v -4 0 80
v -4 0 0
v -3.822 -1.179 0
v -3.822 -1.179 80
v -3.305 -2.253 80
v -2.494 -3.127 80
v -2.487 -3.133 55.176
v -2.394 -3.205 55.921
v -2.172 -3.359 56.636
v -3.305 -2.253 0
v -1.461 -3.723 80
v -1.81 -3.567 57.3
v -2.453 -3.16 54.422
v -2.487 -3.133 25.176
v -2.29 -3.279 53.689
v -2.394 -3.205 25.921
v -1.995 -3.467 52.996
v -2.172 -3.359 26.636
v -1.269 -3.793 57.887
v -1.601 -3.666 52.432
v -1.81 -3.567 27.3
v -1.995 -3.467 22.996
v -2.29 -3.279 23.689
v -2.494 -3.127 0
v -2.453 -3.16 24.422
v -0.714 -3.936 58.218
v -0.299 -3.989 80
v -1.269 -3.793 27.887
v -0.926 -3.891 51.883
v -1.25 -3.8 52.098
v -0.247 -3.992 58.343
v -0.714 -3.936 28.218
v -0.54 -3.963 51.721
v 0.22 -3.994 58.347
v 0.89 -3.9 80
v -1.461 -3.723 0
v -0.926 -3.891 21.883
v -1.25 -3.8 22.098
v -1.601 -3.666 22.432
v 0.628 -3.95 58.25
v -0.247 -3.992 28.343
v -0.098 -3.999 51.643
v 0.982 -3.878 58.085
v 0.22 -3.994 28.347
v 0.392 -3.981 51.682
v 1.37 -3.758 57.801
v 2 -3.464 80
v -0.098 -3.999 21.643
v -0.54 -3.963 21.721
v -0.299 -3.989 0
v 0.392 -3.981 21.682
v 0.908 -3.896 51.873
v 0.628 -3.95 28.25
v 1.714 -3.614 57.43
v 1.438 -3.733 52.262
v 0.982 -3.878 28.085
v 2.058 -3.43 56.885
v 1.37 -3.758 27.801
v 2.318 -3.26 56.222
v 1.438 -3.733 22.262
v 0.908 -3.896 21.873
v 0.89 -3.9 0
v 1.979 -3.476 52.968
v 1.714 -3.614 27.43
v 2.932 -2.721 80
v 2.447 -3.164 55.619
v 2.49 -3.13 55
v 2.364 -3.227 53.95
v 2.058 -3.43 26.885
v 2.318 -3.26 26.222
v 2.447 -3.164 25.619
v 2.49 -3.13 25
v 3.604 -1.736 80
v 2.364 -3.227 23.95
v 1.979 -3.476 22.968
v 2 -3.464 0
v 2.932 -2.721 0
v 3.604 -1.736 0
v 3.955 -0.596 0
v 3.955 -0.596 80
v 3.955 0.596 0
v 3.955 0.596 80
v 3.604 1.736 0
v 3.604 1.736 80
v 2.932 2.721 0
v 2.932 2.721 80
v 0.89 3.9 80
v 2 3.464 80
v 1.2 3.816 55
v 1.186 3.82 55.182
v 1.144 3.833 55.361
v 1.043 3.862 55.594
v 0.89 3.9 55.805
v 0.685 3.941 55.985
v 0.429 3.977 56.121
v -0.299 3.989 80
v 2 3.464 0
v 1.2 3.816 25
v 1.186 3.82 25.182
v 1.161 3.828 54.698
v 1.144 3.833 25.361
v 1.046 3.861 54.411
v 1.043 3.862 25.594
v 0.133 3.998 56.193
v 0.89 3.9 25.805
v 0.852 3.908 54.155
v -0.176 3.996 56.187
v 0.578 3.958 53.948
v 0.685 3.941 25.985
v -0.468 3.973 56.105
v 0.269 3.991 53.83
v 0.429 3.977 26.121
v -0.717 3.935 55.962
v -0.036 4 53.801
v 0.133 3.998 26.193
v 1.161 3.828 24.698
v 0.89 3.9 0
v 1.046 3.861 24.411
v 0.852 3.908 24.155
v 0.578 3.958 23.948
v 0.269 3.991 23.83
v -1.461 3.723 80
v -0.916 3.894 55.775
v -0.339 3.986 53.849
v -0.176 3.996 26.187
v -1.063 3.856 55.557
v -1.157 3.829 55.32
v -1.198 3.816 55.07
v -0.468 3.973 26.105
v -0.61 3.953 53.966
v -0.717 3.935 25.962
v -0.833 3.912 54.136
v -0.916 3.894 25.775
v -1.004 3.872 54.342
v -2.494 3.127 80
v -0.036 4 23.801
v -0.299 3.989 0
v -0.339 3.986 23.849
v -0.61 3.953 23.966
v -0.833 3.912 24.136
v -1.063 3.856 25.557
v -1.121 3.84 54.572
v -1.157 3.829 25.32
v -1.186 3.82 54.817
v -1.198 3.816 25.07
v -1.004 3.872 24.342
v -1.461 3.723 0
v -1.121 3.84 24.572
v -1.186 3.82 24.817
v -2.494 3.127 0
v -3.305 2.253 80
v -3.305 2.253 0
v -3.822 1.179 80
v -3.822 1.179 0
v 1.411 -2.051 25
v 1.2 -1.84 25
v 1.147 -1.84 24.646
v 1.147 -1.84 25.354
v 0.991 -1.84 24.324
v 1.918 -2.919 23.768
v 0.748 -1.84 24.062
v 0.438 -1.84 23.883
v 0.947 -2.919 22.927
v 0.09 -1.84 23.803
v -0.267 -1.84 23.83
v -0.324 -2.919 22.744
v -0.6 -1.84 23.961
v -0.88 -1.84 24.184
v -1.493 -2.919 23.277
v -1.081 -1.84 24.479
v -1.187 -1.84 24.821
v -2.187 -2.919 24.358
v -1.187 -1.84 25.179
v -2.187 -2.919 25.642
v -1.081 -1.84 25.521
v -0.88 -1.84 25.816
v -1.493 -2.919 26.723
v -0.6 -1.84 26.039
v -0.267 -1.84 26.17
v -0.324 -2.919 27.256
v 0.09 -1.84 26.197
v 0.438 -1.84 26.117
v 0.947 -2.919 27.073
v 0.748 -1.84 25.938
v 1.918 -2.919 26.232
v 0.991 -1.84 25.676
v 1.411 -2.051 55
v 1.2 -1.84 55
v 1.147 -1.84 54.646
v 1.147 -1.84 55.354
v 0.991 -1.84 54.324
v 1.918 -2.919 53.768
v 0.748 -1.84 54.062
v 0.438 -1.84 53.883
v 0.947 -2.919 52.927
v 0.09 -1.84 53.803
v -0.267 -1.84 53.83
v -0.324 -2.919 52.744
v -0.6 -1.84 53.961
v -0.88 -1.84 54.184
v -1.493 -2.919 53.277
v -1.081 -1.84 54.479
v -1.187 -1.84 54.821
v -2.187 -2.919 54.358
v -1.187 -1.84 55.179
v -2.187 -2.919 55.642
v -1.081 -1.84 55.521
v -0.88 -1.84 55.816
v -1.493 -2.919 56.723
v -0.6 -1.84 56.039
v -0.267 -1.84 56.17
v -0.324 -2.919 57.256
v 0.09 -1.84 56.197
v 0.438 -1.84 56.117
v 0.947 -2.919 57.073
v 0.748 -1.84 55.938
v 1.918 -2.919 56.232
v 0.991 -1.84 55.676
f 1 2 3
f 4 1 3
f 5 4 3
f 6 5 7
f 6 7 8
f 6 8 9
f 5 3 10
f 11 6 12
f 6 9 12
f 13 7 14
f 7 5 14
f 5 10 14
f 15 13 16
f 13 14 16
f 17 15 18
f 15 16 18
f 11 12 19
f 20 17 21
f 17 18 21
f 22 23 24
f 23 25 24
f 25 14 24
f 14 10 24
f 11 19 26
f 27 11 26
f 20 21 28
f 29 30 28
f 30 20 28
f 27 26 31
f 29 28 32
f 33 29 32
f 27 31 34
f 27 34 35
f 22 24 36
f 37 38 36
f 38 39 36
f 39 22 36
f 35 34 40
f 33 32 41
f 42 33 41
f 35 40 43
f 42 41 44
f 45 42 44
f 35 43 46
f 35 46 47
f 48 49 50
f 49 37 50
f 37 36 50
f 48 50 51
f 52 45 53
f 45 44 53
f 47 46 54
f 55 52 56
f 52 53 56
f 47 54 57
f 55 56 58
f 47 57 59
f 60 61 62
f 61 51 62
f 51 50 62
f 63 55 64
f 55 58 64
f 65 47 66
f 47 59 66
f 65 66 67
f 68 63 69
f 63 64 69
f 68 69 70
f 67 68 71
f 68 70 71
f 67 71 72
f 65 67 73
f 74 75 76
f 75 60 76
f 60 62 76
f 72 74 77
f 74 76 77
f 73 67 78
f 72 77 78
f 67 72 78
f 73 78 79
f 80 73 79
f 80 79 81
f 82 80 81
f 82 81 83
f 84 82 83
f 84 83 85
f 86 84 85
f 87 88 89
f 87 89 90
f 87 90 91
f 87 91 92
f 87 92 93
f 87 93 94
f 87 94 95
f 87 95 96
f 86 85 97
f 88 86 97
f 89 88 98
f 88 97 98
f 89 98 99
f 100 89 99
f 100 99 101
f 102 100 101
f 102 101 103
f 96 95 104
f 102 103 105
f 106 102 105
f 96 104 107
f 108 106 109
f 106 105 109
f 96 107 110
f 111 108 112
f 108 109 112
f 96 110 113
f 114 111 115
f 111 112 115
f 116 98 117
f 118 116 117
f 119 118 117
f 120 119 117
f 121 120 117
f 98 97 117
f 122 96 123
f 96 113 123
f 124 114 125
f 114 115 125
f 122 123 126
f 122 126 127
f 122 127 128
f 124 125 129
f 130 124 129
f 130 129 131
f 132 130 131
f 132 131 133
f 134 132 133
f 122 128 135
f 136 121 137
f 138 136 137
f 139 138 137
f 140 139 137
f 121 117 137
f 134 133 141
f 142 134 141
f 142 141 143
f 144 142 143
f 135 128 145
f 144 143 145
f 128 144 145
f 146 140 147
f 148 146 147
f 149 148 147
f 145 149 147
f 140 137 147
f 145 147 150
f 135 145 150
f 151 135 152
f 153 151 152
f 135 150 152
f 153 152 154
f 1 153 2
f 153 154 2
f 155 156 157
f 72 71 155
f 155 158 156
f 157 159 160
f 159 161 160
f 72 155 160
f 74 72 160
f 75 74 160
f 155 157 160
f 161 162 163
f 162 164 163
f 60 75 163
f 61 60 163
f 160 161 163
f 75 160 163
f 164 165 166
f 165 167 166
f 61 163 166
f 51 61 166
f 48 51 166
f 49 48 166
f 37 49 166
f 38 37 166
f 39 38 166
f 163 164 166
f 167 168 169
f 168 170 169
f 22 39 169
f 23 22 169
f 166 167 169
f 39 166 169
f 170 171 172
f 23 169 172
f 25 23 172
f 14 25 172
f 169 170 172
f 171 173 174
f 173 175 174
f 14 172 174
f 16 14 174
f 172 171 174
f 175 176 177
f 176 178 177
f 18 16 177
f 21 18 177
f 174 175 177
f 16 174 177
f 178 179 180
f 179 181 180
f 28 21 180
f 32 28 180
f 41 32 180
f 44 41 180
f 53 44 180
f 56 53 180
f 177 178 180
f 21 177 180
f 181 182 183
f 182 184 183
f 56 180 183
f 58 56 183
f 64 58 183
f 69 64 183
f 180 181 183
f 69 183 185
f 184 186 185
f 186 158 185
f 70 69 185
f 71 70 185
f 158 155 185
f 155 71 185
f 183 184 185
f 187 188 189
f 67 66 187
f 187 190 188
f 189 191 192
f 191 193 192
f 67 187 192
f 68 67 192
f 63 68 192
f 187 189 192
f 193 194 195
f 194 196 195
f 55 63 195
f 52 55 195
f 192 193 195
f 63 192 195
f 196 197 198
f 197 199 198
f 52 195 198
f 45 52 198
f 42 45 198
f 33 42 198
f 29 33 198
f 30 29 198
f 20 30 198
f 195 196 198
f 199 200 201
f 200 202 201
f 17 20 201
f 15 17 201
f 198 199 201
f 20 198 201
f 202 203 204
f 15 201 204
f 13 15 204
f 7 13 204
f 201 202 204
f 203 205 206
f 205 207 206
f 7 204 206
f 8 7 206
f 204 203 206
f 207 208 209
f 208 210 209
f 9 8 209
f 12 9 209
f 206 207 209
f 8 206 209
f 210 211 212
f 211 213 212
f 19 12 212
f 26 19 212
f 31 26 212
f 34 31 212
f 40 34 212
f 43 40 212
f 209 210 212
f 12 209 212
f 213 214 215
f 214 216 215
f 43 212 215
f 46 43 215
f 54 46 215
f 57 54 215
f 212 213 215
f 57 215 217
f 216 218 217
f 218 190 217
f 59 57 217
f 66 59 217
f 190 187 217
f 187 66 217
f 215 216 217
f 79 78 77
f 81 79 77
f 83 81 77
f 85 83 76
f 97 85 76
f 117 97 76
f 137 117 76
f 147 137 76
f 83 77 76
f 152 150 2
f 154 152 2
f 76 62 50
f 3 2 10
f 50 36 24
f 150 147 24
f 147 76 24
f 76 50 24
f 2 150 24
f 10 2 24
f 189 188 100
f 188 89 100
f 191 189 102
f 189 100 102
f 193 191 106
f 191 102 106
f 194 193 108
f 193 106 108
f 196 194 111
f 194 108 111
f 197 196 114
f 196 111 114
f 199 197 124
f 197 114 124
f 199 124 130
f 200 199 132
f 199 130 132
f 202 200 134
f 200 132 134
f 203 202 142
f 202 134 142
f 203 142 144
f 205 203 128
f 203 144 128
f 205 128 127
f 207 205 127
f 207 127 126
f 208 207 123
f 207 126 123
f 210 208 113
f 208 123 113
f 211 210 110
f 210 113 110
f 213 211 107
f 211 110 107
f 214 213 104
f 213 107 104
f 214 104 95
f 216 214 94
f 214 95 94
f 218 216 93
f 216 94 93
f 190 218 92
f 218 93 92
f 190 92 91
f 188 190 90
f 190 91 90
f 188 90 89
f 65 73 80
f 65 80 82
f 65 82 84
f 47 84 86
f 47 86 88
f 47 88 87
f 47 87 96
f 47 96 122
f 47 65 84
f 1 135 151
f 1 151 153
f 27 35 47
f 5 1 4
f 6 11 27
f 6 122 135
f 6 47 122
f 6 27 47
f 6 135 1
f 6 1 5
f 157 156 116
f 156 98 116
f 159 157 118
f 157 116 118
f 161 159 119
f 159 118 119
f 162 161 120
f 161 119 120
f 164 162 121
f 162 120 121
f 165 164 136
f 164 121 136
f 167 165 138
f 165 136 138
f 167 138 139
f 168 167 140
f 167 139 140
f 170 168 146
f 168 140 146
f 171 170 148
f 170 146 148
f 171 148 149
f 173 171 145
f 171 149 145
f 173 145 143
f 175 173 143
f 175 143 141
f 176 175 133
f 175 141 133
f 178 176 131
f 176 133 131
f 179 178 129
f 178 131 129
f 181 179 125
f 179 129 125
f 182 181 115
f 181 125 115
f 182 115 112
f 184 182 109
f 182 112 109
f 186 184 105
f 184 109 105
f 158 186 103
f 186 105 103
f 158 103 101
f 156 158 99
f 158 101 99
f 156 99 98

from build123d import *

# Parameters (mm, degrees)
F0_R           = 4
F1_DEPTH       = 80
F4_D           = 2.4
F4_DEPTH       = 50
F4_CSINK_D     = 6.72
F4_CSINK_ANGLE = 90
F4_TIP         = 0.7210327428
F5_ANGLE       = 180


with BuildPart() as f1:
    # F0 (on Top) → F1 (new body)
    with BuildSketch(Plane.XY):
        Circle(F0_R)
    extrude(amount=F1_DEPTH)

    # F4
    with Locations(Plane(origin=(0, 4, 0), x_dir=(1, 0, 0), z_dir=(0, 1, 0))):
        with Locations((0, -55), (0, -25)):
            CounterSinkHole(F4_D / 2, F4_CSINK_D / 2, depth=F4_DEPTH, counter_sink_angle=F4_CSINK_ANGLE)
            with Locations((0, 0, -(F4_DEPTH + F4_TIP / 2))):  # 118° drill point
                Cone(0, F4_D / 2, F4_TIP, mode=Mode.SUBTRACT)


with BuildPart() as f1_1:
    # F5: moved
    add(f1.part.rotate(Axis((0, 0, 80), (0, 0, 1)), F5_ANGLE))


solid = f1_1.part
